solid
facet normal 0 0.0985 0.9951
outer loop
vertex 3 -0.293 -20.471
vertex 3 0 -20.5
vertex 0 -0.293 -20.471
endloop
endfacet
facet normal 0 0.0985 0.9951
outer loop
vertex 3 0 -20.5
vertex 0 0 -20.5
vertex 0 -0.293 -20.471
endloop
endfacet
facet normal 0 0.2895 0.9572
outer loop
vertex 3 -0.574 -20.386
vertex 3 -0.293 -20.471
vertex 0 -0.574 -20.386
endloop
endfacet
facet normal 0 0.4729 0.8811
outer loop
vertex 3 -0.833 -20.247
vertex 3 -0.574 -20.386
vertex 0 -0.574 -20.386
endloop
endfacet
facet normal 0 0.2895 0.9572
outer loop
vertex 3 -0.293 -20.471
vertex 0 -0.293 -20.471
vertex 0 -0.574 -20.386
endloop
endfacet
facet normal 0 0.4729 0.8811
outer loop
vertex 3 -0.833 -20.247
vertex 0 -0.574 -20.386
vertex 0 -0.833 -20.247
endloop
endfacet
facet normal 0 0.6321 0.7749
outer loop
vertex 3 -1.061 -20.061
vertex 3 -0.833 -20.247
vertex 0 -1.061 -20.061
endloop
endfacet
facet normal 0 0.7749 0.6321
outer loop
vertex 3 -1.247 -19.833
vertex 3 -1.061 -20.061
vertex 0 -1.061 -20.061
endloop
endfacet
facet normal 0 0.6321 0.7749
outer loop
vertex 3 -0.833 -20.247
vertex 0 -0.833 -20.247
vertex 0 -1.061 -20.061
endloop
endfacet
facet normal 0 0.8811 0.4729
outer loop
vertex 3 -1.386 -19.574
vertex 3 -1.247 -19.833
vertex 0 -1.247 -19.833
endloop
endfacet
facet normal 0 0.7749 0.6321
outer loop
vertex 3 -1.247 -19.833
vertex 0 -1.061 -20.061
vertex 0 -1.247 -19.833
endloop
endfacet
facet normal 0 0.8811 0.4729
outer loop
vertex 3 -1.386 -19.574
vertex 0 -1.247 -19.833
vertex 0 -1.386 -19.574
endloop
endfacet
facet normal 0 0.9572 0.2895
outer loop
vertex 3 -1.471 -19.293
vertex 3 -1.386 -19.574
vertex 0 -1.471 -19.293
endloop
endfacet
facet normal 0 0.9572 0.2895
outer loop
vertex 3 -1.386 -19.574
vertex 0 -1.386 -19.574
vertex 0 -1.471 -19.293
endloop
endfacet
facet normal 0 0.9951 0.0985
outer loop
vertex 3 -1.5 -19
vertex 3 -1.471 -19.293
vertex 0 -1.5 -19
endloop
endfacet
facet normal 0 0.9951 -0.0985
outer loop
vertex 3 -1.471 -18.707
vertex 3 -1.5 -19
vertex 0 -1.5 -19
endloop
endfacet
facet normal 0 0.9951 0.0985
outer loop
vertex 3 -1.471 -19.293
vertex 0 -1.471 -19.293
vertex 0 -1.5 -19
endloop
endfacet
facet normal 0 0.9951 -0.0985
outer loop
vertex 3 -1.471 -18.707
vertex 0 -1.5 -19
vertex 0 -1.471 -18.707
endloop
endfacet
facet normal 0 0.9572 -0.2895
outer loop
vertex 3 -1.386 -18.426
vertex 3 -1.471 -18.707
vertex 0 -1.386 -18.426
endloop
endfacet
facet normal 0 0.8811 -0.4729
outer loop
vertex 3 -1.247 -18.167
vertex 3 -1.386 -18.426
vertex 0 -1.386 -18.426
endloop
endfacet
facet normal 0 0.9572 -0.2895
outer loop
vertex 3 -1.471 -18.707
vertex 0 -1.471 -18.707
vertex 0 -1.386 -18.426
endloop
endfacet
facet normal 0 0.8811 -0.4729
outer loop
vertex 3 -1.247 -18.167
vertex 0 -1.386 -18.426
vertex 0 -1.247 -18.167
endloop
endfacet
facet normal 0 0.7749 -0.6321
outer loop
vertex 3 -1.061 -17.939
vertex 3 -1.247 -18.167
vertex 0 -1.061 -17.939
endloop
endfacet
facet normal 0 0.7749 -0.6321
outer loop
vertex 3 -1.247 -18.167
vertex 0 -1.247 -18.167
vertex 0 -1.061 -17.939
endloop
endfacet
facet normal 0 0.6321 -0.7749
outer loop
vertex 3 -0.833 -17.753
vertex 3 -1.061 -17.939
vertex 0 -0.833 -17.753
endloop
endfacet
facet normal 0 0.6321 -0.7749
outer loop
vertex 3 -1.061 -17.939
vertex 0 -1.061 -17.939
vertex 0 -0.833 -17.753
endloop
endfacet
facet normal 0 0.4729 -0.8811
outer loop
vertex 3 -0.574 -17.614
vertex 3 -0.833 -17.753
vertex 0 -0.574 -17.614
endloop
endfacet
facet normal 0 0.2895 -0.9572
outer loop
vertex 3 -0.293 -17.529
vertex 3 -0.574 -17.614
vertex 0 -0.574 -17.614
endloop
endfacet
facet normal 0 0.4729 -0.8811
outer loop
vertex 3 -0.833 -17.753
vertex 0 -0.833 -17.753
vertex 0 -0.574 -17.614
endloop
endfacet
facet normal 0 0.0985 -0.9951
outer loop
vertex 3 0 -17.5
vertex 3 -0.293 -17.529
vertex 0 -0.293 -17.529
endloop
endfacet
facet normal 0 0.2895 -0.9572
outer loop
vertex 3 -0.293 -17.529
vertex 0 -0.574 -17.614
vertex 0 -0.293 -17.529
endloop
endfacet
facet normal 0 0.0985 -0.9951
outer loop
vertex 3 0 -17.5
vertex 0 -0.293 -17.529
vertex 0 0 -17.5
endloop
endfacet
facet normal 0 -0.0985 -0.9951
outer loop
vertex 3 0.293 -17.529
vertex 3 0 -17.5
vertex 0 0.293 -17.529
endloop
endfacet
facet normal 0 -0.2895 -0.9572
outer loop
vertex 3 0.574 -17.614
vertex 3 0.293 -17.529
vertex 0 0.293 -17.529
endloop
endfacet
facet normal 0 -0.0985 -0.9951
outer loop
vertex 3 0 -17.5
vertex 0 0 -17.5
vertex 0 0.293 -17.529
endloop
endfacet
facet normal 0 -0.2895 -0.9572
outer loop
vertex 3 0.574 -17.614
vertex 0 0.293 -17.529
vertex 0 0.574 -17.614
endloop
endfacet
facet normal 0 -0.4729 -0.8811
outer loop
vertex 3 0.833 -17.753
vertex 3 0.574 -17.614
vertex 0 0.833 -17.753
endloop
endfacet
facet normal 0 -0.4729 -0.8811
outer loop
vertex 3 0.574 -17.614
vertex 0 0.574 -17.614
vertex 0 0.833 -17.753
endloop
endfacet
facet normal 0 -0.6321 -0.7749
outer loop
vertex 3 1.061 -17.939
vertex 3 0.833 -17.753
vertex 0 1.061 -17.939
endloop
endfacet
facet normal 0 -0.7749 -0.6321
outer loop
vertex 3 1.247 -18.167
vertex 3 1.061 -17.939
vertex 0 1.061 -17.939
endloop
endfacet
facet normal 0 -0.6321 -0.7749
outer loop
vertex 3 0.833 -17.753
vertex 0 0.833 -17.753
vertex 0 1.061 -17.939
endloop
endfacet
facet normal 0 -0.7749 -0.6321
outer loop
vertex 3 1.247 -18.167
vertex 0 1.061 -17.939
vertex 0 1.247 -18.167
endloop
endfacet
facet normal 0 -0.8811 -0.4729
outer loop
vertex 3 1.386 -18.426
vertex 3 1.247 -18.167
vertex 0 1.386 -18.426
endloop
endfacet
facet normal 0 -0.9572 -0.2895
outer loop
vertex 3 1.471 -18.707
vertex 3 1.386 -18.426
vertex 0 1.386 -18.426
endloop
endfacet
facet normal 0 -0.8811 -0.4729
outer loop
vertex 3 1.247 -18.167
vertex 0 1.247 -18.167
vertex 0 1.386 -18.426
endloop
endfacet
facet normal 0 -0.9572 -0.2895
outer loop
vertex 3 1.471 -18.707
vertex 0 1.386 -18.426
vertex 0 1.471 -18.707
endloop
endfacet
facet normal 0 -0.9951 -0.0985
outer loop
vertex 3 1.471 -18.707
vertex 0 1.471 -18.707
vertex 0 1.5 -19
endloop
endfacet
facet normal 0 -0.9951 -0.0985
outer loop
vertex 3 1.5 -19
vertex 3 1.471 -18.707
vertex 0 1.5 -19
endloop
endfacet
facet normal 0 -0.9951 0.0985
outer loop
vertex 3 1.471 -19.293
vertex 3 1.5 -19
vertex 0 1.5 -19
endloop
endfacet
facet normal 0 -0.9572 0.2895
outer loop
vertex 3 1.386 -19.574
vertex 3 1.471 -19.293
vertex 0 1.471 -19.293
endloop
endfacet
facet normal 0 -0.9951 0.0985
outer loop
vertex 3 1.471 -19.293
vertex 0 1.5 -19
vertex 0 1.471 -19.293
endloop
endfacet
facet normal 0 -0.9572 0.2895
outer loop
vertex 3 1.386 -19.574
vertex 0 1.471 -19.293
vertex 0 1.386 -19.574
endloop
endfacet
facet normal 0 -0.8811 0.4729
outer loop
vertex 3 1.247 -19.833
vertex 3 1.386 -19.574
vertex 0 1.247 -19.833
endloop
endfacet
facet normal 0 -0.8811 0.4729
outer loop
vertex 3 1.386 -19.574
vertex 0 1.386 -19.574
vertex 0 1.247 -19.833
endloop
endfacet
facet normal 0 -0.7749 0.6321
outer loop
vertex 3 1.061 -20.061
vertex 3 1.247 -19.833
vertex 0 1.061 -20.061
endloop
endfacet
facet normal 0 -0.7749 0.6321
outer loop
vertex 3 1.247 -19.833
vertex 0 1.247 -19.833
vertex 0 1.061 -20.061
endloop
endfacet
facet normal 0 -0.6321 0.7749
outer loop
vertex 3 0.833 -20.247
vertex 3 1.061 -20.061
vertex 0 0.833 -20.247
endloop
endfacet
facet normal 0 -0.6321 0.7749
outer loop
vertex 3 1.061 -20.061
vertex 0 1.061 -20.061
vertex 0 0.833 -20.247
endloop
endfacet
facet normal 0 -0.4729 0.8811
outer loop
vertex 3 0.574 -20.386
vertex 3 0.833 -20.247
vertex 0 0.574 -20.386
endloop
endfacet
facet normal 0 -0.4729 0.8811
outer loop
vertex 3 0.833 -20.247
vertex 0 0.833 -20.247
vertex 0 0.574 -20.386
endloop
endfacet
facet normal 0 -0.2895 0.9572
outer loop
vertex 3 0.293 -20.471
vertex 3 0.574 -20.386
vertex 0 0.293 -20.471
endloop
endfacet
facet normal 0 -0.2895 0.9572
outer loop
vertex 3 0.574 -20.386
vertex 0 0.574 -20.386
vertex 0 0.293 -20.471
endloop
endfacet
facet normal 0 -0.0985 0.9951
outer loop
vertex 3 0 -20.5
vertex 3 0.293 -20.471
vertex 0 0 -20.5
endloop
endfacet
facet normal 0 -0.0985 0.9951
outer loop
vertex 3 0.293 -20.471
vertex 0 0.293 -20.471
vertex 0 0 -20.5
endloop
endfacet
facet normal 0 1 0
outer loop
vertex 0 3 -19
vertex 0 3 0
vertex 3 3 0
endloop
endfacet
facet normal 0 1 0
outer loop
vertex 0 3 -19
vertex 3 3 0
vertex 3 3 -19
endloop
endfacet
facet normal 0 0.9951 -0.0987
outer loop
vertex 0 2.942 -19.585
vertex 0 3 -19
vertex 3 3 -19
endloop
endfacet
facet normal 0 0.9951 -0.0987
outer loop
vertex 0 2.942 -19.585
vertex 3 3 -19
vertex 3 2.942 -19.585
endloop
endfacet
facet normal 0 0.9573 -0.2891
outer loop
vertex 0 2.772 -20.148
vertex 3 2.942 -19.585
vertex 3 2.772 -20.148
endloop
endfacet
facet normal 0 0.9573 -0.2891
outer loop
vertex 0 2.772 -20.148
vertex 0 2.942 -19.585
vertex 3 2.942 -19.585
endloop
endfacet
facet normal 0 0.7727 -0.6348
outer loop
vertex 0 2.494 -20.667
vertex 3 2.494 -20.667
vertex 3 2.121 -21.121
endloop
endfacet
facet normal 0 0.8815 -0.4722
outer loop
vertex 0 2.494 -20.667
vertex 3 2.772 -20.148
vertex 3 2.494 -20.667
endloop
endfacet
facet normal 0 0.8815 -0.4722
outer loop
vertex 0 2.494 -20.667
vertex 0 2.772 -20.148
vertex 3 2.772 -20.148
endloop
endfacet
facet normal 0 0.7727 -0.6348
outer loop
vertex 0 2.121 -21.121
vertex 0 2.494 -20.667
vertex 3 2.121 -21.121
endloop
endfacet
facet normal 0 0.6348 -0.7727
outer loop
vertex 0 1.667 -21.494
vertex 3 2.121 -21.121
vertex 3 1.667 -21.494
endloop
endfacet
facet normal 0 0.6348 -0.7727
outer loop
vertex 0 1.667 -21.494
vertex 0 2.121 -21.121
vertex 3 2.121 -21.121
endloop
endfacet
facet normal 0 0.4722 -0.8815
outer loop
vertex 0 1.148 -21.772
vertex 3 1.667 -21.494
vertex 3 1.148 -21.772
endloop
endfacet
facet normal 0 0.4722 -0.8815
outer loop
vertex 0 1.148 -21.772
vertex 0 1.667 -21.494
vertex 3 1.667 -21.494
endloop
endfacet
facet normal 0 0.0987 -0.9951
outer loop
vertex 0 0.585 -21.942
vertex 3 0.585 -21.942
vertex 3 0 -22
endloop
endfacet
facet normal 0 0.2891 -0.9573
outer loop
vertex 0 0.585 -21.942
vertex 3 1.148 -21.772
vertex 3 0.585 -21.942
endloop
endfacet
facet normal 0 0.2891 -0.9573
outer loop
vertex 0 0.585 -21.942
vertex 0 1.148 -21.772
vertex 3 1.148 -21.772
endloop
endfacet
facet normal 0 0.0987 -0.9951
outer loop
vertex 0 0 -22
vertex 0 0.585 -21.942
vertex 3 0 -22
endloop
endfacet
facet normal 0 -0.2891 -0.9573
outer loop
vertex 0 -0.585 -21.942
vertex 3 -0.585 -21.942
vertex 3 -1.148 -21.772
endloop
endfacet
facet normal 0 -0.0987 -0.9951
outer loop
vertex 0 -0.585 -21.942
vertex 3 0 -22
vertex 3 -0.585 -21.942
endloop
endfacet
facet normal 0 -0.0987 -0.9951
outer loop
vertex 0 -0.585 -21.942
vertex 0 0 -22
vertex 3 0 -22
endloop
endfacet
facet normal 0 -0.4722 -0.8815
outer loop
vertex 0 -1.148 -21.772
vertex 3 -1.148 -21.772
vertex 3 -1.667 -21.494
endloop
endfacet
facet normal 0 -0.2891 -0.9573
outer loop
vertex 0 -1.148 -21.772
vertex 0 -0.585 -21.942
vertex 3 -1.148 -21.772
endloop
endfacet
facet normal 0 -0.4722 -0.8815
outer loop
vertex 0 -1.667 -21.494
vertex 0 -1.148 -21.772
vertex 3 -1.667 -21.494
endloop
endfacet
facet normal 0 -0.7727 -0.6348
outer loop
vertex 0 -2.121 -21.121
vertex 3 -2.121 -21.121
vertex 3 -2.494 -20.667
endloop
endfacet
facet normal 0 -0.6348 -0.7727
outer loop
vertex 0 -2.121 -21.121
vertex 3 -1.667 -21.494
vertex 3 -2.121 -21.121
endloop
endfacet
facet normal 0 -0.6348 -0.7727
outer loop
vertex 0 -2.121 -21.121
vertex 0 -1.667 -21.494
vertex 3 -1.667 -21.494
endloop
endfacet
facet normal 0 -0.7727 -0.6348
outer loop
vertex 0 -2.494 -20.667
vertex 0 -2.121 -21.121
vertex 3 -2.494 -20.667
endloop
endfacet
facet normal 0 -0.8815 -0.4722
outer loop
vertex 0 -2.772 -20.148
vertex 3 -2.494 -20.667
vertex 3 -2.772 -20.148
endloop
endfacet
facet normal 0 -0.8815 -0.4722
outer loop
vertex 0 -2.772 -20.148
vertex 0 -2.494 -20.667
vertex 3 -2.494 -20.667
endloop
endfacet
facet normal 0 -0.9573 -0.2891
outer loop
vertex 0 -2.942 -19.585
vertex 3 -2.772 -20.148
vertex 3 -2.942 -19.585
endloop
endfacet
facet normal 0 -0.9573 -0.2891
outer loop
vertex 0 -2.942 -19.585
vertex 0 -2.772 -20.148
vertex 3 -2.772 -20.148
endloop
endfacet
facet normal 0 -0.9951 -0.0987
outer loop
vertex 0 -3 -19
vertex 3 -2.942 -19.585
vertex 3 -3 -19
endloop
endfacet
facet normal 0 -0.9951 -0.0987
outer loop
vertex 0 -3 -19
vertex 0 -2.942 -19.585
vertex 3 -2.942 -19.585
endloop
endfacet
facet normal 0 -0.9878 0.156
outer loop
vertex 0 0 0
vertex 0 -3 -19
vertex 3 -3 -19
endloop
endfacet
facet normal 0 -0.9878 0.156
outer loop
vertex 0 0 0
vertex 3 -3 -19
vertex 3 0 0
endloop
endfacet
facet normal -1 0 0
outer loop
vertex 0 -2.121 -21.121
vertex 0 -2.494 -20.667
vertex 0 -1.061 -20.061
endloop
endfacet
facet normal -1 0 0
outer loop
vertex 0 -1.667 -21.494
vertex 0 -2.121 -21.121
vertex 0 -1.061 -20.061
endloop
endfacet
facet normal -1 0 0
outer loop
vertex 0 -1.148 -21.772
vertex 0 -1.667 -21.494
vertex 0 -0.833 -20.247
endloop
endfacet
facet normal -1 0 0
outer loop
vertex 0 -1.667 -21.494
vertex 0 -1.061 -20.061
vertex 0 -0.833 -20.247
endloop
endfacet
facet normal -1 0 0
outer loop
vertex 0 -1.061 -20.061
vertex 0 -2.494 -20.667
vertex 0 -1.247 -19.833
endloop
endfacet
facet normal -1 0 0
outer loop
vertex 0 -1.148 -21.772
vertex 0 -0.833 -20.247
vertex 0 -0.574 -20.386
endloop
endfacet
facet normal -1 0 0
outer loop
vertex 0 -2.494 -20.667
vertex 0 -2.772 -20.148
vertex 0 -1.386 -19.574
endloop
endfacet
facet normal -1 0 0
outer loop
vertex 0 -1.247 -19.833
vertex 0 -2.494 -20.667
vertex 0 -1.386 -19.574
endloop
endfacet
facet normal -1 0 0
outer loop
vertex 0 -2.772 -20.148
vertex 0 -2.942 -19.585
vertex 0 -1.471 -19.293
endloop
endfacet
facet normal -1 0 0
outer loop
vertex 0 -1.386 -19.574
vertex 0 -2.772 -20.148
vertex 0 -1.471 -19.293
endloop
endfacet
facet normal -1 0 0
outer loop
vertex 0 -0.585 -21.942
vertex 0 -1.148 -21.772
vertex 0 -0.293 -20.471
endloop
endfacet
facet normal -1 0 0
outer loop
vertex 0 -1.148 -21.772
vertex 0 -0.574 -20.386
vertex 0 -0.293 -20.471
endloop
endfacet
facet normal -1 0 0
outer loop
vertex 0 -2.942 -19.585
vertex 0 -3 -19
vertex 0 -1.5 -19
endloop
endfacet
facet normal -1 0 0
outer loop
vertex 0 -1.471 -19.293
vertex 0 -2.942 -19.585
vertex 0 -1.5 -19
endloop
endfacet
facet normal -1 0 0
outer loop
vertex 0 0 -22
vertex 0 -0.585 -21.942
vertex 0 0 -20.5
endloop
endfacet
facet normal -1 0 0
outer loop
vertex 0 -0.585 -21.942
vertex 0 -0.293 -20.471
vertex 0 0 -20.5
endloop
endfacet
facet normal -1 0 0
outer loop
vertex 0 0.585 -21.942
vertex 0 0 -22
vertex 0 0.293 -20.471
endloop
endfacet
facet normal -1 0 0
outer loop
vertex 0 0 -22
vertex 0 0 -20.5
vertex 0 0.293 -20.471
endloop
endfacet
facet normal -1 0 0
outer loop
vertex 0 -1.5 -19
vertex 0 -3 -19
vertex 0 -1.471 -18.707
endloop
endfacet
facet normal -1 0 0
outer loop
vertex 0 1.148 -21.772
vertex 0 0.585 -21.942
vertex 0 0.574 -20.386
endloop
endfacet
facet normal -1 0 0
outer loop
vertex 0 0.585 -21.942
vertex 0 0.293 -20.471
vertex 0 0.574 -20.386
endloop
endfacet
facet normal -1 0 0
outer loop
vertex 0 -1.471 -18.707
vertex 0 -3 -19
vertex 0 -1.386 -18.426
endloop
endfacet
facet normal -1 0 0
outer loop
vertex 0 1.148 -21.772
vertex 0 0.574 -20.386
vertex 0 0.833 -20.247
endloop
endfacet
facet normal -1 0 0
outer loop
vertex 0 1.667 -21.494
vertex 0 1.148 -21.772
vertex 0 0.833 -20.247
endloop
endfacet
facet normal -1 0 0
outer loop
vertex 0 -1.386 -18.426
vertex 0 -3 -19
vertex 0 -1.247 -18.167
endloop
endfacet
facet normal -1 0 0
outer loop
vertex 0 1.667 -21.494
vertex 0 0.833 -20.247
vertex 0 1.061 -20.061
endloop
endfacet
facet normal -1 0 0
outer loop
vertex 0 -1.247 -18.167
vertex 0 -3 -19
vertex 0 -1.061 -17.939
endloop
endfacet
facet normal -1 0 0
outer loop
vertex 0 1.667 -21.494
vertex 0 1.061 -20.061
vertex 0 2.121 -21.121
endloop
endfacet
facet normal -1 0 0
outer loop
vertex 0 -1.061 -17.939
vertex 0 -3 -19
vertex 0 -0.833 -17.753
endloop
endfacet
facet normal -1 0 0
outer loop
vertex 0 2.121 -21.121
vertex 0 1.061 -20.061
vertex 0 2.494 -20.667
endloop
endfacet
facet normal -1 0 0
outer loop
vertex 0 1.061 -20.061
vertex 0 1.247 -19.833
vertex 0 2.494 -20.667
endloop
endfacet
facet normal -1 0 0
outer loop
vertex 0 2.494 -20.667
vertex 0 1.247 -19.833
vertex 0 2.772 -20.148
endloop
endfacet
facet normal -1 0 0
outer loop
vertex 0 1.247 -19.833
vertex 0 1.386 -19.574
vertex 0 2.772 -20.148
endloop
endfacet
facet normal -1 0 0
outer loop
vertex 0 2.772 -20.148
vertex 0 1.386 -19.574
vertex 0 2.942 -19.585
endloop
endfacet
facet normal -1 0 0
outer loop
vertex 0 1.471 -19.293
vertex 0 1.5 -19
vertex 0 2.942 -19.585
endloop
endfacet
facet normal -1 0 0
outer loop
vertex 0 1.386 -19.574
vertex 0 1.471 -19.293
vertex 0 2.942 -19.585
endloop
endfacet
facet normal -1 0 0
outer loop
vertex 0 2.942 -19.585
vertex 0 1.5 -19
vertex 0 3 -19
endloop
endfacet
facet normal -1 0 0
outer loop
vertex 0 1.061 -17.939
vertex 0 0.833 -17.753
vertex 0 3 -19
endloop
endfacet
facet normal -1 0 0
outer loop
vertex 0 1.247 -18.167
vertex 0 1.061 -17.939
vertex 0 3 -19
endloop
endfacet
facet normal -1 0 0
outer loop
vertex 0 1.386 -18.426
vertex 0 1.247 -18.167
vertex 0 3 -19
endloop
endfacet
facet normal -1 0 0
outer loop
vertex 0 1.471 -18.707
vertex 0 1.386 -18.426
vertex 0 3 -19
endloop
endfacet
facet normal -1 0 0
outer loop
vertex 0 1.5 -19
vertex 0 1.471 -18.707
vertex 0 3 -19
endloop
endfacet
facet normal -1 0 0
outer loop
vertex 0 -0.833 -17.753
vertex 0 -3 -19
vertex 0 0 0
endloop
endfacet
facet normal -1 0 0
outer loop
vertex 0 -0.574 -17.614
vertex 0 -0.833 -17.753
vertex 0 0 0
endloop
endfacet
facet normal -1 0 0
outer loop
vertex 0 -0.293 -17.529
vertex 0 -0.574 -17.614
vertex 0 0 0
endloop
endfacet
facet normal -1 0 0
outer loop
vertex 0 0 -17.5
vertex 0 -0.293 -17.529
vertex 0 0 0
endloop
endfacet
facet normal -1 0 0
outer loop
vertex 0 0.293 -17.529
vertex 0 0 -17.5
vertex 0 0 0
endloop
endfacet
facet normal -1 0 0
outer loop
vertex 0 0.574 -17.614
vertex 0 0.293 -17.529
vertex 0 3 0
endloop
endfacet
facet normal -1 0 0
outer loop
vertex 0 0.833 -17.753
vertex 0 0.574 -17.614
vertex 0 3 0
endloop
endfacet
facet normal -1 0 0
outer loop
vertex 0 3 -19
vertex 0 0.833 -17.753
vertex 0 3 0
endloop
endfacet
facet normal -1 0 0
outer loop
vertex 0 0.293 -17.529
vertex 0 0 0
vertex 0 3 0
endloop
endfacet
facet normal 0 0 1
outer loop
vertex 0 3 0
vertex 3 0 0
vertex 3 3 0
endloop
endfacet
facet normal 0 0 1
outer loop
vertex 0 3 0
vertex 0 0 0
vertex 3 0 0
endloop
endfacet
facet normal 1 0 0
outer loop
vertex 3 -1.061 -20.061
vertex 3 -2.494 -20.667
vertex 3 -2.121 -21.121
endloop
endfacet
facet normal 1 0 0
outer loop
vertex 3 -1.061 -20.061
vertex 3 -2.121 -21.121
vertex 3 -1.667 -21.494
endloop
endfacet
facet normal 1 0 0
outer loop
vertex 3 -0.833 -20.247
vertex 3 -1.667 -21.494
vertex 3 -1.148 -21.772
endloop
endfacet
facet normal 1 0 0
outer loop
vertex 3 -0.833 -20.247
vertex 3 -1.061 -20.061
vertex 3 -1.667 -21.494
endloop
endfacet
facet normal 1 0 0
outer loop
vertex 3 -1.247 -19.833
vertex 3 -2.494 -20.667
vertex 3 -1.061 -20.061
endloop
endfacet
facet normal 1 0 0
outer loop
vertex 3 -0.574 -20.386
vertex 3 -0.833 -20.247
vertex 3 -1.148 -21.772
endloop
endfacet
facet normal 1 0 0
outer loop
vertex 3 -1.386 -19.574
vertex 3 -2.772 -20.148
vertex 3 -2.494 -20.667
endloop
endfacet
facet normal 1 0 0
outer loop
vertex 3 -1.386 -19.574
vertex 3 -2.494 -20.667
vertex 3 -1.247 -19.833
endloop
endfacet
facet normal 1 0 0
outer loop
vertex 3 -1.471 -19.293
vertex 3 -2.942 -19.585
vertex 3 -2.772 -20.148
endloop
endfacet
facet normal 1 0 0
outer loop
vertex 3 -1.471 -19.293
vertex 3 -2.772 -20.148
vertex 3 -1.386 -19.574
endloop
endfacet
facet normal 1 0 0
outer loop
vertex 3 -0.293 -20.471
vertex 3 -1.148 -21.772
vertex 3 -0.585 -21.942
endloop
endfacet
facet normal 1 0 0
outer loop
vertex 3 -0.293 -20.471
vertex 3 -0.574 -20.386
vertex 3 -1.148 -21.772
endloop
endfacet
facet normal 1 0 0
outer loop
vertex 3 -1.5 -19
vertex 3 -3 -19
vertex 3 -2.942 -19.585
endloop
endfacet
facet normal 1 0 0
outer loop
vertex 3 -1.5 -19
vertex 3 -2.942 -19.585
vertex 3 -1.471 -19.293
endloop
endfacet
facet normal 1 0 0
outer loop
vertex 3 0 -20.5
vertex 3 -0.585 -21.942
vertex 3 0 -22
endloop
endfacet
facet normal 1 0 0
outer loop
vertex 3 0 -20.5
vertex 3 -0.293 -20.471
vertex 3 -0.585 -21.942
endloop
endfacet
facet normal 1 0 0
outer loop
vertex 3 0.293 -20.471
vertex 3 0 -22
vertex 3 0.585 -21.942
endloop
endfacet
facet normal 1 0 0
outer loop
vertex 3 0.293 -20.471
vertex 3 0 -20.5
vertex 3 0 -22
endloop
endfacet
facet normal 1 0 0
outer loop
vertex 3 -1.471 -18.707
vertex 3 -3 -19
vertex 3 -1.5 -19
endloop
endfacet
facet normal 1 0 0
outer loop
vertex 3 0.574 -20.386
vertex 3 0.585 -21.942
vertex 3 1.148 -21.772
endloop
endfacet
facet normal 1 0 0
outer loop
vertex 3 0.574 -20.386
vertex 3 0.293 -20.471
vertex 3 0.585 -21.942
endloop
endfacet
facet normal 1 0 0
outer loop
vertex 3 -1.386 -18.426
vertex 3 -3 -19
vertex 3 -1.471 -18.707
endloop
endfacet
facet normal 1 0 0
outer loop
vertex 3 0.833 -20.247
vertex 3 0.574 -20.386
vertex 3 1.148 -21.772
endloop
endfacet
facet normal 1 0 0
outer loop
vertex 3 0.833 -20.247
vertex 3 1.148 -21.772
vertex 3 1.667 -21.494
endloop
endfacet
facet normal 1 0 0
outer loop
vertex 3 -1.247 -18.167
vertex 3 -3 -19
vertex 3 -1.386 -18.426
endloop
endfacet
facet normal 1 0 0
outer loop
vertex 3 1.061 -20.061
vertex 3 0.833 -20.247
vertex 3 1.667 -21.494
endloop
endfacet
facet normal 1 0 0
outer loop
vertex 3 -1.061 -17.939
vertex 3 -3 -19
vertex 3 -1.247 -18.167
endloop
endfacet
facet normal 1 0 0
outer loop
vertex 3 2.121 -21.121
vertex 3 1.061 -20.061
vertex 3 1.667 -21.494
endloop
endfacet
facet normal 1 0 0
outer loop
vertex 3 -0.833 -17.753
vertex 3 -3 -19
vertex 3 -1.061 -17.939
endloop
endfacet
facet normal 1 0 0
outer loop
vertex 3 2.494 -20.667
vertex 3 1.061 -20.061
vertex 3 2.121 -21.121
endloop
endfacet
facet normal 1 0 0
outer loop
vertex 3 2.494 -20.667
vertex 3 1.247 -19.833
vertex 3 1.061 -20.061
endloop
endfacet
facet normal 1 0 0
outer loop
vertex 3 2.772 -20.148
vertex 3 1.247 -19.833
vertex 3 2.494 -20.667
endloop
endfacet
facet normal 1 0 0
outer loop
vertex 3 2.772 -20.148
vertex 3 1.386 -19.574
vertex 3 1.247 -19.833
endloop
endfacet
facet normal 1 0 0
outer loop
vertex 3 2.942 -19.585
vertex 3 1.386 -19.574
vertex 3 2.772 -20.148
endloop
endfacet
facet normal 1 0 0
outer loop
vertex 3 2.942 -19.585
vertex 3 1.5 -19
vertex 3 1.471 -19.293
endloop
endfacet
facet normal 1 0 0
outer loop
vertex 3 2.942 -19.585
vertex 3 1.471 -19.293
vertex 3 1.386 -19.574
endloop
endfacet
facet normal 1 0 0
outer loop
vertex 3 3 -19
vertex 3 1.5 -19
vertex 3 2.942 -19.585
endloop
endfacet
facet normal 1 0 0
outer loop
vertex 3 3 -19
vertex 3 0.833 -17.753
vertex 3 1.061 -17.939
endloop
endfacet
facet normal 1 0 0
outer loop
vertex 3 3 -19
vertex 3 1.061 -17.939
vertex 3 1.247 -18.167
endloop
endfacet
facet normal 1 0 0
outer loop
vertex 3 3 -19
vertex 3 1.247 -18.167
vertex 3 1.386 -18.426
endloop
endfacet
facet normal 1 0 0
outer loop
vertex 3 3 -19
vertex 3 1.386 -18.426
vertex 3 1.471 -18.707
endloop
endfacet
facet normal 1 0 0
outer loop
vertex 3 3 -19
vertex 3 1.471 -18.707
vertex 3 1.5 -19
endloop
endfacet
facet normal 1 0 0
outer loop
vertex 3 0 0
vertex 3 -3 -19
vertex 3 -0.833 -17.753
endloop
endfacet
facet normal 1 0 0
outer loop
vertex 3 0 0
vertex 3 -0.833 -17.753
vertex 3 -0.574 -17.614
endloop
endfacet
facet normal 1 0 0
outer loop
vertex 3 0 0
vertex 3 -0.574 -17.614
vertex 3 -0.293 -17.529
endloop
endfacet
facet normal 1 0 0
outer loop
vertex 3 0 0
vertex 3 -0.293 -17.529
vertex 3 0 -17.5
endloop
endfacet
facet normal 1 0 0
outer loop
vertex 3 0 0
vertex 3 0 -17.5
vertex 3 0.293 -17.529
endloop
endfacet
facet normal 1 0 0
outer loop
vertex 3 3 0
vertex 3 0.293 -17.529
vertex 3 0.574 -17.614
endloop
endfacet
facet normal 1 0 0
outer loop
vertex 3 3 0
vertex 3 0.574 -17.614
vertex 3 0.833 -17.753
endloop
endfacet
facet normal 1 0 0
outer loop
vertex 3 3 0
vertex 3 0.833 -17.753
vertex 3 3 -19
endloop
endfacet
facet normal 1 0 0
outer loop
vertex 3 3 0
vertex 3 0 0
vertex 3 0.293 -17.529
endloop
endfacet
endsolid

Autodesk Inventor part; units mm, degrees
ref_plane "YZ Plane" through (0, 0, 0) normal (1, 0, 0) x (0, 1, 0)
ref_plane "XZ Plane" through (0, 0, 0) normal (0, 1, 0) x (-1, 0, 0)
ref_plane "XY Plane" through (0, 0, 0) normal (0, 0, 1) x (1, 0, 0)
sketch "Skizze1" plane through (0, 0, 0) normal (1, 0, 0) x (0, 1, 0)
  line L0 (0, 0) -> (3, 0)
  line L1 (3, 0) -> (3, -19)
  arc A0 (-3, -19) -> (3, -19) centre (0, -19) ccw
  line L2 (-3, -19) -> (0, 0)
  dimension "d0" = 3
  dimension "d1" = 19
  dimension "d2" = 3
  dimension "d3" = 3
extrude "Extrusion1" add sketch "Skizze1" along normal blind 3
sketch "Skizze2" plane through (3, 0, 0) normal (1, 0, 0) x (0, 0, -1)
  arc A0 (19, -3) -> (19, 3) centre (19, 0) ccw projected
  point P0 (0, 0)
hole "Bohrung1" at (3, 0, -19) direction (-1, 0, 0) diameter 3 depth 3
properties part number "109 part 2"
